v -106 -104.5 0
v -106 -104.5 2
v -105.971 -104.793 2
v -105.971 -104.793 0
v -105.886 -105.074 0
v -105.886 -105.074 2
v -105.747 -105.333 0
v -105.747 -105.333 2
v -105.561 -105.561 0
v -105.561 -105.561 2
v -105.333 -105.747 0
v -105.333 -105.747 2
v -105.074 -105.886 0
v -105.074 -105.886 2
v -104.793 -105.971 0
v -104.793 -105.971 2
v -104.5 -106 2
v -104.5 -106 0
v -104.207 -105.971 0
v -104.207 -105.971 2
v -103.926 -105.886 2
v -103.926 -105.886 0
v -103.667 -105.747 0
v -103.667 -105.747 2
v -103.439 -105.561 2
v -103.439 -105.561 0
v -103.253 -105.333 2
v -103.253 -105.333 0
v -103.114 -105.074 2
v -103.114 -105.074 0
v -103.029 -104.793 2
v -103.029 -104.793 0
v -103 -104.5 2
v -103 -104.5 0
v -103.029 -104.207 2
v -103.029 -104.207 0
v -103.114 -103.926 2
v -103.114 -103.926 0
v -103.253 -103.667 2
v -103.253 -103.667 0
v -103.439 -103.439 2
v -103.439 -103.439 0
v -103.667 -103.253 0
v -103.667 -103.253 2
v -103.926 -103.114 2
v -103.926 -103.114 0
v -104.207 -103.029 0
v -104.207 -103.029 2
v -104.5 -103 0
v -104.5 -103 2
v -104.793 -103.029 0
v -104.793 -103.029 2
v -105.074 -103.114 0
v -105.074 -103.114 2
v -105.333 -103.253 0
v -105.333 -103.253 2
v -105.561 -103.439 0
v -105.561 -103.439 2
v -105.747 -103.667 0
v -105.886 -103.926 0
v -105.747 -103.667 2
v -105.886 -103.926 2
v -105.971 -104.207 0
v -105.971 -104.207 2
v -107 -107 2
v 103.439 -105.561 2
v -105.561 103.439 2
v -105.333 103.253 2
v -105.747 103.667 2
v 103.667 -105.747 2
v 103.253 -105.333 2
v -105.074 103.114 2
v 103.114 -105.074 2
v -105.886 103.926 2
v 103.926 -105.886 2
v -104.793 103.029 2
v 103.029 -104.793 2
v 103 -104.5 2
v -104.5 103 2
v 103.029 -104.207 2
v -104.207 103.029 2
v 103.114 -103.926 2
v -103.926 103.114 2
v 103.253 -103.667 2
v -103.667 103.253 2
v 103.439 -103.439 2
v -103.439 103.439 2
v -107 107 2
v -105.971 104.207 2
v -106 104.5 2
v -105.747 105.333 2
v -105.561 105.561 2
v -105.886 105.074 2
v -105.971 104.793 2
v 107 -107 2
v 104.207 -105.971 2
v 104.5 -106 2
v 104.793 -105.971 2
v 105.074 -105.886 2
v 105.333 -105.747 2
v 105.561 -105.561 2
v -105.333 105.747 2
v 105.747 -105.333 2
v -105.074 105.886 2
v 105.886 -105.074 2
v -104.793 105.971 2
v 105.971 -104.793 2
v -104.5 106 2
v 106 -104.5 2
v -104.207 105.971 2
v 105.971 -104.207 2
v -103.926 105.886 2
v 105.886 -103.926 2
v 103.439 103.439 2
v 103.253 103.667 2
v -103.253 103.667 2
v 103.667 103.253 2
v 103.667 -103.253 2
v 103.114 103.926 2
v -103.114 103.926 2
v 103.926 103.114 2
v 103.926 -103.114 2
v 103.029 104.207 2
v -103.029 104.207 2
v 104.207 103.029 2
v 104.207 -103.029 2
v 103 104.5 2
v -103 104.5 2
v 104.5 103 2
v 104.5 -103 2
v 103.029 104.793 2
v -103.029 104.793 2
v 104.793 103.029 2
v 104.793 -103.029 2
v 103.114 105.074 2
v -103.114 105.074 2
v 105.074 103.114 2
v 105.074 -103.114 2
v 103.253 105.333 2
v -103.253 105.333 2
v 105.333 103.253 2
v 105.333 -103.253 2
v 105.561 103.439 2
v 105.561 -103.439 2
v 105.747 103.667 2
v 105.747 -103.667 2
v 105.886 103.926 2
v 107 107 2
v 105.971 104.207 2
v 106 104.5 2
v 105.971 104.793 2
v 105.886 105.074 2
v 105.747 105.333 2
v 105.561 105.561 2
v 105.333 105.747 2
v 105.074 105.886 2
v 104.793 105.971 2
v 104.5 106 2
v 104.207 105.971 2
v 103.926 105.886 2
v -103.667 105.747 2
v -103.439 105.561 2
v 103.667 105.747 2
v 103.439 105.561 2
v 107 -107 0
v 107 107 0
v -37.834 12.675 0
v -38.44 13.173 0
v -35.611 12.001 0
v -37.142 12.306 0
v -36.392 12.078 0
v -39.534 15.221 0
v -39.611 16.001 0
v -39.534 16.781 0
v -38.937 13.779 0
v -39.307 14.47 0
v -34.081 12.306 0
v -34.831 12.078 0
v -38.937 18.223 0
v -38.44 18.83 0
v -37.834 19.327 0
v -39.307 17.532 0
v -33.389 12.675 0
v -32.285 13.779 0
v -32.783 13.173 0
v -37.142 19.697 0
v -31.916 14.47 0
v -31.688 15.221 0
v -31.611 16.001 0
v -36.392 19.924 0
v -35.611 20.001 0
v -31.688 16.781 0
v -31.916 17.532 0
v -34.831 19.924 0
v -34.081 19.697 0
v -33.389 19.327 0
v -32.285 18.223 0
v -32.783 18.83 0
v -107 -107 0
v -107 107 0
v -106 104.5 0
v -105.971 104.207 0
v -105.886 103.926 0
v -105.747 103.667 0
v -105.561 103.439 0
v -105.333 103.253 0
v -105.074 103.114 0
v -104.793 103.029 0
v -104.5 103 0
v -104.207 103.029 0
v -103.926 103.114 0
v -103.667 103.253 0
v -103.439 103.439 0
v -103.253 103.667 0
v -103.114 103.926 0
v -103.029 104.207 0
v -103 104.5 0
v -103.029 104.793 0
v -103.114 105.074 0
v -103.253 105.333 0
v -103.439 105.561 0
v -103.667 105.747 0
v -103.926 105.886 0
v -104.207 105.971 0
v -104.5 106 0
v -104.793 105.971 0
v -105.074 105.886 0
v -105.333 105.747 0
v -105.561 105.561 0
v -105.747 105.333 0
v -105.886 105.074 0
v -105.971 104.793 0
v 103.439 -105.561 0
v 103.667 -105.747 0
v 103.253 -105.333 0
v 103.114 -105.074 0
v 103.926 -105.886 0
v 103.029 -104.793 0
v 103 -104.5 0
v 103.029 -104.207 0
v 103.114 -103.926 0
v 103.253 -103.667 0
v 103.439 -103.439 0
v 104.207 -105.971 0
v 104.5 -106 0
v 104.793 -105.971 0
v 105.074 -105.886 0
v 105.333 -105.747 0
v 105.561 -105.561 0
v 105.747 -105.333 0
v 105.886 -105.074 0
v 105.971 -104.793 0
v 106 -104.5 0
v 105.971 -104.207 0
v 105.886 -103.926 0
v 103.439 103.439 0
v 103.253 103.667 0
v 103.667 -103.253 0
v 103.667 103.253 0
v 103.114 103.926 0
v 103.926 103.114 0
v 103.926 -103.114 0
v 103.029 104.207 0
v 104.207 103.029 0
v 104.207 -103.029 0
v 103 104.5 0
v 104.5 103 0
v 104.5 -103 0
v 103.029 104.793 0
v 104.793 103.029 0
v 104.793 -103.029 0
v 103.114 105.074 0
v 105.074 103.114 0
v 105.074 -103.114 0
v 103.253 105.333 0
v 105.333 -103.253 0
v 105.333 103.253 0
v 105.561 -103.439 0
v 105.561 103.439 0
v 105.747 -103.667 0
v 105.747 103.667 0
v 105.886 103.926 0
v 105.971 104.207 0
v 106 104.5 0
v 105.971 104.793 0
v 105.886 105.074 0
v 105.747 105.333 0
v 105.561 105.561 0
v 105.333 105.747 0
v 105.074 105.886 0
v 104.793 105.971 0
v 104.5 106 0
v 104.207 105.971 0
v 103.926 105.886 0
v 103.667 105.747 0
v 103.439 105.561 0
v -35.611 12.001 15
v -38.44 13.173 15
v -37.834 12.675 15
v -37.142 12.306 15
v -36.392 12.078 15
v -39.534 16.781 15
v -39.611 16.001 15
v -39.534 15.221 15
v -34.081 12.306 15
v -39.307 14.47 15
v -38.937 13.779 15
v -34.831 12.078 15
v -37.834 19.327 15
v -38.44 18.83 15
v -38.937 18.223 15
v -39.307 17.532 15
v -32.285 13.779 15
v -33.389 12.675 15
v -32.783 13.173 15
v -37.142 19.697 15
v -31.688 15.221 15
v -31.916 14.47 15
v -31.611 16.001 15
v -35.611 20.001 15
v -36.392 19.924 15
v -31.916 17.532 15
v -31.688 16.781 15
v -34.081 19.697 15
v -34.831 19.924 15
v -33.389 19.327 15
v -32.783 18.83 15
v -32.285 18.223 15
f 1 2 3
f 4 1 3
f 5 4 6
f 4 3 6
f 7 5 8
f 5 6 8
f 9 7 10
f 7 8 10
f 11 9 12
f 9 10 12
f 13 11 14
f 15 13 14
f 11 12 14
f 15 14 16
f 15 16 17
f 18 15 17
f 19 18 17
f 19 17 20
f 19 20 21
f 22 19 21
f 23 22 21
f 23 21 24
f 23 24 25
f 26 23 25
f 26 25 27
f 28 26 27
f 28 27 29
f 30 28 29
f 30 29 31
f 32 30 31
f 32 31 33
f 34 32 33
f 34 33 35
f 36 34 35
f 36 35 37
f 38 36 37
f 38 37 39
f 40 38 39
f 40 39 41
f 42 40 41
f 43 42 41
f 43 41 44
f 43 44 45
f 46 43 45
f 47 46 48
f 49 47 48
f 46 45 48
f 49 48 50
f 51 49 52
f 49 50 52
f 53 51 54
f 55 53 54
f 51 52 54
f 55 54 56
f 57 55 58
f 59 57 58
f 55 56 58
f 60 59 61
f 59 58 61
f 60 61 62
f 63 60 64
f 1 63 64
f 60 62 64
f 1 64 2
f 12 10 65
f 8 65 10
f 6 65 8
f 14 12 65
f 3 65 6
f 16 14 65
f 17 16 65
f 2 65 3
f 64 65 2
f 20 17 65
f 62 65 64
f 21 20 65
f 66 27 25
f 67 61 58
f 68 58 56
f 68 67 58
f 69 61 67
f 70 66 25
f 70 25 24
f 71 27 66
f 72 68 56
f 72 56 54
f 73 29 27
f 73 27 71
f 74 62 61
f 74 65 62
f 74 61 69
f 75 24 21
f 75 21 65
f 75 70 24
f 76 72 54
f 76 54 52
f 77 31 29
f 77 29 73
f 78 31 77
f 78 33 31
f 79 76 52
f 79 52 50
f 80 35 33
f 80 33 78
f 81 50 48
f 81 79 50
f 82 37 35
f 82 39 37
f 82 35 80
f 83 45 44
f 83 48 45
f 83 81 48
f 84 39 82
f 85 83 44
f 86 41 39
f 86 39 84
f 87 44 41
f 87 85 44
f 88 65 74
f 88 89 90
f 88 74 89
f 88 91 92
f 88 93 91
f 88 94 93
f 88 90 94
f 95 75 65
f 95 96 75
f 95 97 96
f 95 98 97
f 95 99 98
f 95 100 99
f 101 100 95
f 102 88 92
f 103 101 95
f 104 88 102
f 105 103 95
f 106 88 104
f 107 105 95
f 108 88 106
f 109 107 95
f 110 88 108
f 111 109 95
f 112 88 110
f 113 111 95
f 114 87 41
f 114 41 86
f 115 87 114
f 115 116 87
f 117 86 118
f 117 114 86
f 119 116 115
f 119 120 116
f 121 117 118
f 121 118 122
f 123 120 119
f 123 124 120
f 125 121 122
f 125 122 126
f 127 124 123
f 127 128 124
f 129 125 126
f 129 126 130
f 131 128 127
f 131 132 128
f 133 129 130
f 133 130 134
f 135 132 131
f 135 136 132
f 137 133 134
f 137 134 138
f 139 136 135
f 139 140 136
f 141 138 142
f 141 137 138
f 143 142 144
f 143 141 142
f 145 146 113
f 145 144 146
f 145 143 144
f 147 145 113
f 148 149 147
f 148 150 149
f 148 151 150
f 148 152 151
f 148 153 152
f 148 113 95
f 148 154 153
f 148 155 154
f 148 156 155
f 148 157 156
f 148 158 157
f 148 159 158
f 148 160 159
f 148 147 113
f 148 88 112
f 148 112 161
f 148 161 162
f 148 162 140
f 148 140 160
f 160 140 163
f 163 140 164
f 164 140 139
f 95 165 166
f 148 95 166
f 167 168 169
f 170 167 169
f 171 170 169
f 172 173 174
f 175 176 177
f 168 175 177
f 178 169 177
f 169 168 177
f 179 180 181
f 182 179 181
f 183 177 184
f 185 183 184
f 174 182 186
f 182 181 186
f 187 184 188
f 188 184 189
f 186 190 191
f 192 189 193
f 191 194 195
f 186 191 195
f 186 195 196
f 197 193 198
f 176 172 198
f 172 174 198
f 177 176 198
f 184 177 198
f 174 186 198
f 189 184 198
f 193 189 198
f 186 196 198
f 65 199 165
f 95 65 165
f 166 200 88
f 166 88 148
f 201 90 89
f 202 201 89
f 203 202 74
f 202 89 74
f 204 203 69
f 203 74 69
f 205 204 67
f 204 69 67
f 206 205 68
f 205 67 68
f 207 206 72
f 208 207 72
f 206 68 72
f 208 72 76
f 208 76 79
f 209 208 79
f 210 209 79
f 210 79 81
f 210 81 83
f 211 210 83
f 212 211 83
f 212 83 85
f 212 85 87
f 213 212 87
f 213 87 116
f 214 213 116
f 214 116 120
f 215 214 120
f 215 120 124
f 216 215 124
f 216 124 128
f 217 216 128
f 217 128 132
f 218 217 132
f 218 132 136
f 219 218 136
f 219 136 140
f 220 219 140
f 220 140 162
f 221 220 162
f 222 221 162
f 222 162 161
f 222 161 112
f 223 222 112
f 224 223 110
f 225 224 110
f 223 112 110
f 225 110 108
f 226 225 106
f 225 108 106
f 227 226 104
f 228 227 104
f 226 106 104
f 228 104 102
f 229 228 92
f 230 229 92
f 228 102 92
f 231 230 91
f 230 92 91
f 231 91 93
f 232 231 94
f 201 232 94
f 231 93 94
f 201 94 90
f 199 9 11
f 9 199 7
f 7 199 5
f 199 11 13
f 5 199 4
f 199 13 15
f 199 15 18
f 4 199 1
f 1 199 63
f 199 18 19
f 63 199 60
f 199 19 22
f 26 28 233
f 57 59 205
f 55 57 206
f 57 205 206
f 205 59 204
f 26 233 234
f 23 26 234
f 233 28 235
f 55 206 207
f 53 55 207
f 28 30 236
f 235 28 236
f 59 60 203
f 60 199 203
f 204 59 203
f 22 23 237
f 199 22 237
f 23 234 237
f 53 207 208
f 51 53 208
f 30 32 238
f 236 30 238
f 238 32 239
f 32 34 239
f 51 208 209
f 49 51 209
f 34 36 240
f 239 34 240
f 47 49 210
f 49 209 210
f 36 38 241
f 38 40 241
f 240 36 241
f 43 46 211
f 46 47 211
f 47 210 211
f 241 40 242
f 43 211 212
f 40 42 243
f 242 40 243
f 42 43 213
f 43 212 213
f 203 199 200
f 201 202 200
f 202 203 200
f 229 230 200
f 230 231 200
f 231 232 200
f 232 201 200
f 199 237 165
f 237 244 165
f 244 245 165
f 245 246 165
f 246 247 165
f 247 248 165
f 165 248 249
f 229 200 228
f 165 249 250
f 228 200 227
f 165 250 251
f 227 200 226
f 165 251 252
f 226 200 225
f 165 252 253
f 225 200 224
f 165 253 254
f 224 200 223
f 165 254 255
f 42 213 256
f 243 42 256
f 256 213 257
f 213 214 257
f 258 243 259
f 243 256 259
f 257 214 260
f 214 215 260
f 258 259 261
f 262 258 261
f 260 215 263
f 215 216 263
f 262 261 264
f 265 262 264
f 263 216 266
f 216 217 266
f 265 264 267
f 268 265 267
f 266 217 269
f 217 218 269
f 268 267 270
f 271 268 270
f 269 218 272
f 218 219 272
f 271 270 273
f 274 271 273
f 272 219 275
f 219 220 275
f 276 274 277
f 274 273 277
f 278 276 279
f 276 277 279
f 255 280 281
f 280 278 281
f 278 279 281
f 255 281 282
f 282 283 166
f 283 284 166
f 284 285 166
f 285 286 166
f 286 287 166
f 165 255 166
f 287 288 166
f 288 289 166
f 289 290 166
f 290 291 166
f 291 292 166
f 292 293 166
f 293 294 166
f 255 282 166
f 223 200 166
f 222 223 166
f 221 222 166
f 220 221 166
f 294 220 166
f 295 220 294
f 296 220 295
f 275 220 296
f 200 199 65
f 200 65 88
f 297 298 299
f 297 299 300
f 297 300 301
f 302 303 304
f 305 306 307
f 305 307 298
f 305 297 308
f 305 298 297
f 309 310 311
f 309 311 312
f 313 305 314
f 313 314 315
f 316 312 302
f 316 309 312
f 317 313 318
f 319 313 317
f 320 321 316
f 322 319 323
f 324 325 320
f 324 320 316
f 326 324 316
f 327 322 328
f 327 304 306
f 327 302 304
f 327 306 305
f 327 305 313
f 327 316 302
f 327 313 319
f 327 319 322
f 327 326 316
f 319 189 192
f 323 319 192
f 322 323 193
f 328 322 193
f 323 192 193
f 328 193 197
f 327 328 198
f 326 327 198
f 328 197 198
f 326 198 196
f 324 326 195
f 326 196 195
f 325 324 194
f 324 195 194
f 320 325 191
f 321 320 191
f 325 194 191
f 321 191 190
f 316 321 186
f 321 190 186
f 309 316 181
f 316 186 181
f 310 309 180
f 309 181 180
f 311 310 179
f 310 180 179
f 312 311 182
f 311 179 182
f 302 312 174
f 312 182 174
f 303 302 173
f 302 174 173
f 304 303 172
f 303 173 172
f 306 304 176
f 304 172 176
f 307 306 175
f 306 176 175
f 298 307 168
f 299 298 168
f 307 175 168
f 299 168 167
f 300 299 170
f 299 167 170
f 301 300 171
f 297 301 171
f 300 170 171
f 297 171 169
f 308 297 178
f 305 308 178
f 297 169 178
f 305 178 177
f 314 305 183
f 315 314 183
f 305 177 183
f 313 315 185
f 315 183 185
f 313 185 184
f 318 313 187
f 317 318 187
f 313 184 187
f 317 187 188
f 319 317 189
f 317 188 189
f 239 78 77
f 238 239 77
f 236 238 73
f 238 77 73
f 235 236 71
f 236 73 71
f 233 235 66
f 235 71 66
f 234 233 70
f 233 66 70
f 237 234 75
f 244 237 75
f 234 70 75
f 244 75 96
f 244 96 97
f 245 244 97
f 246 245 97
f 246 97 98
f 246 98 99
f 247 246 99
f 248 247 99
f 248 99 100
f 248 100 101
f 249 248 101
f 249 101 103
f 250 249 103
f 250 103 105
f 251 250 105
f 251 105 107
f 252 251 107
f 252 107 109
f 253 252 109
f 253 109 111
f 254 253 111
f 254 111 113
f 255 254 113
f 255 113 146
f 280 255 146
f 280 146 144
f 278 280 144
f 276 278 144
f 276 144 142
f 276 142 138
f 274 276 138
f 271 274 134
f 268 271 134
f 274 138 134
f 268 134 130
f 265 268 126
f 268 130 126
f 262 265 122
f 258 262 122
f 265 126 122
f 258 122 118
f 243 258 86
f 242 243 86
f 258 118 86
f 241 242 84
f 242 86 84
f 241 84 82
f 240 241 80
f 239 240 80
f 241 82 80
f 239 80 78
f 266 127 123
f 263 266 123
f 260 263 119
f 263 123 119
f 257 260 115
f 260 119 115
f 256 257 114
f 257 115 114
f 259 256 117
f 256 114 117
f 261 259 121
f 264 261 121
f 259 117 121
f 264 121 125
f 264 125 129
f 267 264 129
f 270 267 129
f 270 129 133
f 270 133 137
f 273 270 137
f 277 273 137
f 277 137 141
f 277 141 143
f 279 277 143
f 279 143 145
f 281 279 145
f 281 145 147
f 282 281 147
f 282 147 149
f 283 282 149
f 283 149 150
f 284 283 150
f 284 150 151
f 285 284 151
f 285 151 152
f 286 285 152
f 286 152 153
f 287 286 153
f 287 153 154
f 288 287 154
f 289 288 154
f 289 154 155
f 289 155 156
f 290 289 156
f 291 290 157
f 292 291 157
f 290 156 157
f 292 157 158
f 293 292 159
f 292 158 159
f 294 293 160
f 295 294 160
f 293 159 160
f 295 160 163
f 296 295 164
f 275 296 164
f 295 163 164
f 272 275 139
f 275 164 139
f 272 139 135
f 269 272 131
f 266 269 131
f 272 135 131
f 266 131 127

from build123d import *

# Parameters (mm, degrees)
F0_W     = 214
F0_H     = 214
F1_DEPTH = 2
F2_D     = 3
F3_R     = 4
F4_DEPTH = 15


with BuildPart() as f1:
    # F0 (on Top) → F1 (new body)
    with BuildSketch(Plane.XY):
        Rectangle(F0_W, F0_H)
    extrude(amount=F1_DEPTH)

    # F2 (through all)
    with Locations(Plane(origin=(0, 0, 0), x_dir=(1, 0, 0), z_dir=(0, 0, -1))):
        with Locations((-104.5, 104.5), (104.5, 104.5), (-104.5, -104.5), (104.5, -104.5)):
            Hole(F2_D / 2)


with BuildPart() as f4:
    # F3 (on Top) → F4 (new body)
    with BuildSketch(Plane.XY):
        with Locations((-35.611279, 16.001087)):
            Circle(F3_R)
    extrude(amount=F4_DEPTH)


solid = Compound([f1.part, f4.part])
